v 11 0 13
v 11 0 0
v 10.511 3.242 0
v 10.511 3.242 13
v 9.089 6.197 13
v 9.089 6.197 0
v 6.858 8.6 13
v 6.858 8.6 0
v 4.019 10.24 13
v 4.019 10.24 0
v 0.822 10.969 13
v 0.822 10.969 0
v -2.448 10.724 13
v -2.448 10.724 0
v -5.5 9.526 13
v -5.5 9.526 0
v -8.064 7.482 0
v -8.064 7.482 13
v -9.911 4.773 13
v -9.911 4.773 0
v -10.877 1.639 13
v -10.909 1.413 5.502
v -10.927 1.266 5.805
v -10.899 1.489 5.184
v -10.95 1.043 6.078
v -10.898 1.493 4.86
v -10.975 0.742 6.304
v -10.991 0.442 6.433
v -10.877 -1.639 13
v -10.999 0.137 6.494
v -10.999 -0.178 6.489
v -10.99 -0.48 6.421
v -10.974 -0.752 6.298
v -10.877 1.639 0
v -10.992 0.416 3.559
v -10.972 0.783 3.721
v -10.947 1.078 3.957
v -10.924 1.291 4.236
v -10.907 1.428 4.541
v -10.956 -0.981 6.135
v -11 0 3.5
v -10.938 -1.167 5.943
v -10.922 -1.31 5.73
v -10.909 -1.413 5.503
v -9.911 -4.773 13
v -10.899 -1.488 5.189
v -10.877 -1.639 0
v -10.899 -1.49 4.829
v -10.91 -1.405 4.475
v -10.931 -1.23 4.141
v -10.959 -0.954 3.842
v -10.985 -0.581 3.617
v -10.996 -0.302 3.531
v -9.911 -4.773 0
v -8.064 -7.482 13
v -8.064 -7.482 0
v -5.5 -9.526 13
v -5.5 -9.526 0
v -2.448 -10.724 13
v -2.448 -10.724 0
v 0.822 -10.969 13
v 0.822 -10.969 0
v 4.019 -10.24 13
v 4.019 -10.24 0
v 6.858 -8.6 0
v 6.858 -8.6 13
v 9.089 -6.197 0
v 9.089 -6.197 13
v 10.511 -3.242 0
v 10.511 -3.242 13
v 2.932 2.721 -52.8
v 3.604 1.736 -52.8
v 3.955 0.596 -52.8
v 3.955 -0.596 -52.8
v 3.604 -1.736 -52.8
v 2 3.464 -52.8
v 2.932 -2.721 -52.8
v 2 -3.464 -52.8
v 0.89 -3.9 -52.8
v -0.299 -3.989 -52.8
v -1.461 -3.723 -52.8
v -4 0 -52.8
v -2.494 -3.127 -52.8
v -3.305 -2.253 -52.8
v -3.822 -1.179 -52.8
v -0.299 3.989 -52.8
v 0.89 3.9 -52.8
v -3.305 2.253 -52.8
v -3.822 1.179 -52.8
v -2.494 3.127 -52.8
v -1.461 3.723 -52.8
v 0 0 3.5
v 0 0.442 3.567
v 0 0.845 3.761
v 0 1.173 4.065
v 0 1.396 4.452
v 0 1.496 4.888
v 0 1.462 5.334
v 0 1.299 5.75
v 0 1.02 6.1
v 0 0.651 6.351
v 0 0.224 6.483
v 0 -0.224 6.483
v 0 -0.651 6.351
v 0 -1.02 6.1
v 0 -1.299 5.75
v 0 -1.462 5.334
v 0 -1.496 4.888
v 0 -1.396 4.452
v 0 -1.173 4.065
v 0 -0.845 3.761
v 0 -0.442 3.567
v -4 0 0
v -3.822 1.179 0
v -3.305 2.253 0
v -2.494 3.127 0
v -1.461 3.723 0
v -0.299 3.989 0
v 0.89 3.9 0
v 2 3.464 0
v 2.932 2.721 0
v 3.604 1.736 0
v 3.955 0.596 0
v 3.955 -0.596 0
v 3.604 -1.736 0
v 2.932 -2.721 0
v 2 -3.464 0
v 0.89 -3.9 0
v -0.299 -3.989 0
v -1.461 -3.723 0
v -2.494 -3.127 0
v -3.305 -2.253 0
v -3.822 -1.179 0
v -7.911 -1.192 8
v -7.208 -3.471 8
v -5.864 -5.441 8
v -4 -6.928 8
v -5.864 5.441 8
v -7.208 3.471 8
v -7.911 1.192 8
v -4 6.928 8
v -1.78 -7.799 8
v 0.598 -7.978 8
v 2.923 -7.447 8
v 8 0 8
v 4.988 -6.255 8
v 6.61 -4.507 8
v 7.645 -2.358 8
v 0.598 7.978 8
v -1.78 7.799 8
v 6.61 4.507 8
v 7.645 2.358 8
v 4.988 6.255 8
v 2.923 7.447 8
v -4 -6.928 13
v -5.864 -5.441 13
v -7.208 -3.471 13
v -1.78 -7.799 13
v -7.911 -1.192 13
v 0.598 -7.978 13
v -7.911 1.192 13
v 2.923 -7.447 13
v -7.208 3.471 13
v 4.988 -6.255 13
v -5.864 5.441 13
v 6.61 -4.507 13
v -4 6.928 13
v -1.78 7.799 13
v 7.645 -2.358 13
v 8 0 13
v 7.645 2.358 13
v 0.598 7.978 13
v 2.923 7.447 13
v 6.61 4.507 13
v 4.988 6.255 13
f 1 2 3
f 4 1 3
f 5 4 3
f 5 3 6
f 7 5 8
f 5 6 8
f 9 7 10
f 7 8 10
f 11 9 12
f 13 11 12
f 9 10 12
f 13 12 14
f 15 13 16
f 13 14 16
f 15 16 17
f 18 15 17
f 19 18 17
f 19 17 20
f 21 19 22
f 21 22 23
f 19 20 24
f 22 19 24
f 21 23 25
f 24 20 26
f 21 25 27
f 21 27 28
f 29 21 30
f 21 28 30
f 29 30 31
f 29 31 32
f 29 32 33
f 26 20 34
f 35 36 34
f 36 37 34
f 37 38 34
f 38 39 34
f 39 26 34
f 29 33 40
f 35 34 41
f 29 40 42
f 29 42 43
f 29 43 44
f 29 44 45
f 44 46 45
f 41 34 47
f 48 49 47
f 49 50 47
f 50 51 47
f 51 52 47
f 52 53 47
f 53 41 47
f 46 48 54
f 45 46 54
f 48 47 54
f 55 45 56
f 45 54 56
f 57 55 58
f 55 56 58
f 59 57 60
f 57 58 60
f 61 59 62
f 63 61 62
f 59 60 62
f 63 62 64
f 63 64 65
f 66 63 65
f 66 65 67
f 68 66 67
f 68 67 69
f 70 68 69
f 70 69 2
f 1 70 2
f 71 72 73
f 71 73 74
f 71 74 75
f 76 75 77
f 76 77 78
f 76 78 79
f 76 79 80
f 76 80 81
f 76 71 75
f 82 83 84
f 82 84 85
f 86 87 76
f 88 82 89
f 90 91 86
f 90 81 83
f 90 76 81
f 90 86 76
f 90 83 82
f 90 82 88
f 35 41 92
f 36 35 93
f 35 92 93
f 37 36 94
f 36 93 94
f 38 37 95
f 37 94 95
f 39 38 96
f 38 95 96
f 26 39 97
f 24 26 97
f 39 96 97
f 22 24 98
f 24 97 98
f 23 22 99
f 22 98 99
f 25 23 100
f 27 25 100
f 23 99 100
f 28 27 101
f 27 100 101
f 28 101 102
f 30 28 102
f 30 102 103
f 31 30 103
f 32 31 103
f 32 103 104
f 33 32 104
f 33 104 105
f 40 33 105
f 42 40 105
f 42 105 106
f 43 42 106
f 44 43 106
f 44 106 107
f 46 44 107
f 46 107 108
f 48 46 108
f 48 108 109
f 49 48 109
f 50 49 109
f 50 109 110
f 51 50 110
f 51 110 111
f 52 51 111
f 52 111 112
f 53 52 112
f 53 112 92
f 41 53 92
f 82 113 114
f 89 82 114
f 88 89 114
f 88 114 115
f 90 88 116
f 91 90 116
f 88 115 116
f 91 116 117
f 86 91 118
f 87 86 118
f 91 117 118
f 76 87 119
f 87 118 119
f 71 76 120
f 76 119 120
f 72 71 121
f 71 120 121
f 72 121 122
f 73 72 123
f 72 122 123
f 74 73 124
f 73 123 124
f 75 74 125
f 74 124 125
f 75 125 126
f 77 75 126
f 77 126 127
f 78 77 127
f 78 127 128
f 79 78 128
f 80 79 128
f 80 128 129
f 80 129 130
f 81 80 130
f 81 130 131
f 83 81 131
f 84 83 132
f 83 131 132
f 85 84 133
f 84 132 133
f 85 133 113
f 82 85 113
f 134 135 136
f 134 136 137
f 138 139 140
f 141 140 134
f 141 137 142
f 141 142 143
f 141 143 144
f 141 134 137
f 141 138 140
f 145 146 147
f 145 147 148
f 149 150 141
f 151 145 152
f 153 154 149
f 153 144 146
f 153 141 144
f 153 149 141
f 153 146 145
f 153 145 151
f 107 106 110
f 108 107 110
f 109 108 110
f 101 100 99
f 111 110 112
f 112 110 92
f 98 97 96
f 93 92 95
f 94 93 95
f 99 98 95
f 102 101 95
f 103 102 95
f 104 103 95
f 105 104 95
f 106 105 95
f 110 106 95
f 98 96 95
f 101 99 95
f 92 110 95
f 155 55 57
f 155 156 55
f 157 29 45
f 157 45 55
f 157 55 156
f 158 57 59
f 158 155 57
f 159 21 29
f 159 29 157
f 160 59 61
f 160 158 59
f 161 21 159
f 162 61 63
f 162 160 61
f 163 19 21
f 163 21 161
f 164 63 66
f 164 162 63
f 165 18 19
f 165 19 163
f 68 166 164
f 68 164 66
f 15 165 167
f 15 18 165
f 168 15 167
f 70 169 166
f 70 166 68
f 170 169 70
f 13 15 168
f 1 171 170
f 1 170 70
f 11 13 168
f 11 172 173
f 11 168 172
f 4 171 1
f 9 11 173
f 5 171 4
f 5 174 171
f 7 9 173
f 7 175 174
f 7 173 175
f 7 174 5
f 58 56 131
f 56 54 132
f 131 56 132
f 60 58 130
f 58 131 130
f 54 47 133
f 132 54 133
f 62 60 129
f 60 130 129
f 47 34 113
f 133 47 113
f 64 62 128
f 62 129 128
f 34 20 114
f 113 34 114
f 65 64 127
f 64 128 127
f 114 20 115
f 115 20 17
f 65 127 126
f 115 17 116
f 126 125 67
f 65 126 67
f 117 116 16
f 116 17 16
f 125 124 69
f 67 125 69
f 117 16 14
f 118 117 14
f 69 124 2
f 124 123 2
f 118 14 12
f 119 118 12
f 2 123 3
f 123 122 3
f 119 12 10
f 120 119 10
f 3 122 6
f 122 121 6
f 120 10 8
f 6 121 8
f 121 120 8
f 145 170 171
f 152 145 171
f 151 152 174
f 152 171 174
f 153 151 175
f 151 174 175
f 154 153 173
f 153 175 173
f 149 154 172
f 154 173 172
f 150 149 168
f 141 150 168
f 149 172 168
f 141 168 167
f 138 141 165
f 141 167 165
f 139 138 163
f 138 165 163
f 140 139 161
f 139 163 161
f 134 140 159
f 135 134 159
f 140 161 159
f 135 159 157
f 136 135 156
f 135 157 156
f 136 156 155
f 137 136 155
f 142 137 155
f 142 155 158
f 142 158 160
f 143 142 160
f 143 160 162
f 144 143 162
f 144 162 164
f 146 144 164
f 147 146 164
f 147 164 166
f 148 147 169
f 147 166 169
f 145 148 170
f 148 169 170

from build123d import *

# Parameters (mm, degrees)
CROQUIS1_R              = 11
SALIENTE_EXTRUIR1_DEPTH = 13
CROQUIS2_R              = 8
CORTAR_EXTRUIR1_DEPTH   = 5
CROQUIS3_R              = 1.5
CORTAR_EXTRUIR2_DEPTH   = 15
CROQUIS4_R              = 4
SALIENTE_EXTRUIR2_DEPTH = 52.8


with BuildPart() as part:
    # Croquis1 → Saliente-Extruir1 (new body)
    with BuildSketch(Plane.XY):
        Circle(CROQUIS1_R)
    extrude(amount=SALIENTE_EXTRUIR1_DEPTH)

    # Croquis2 → Cortar-Extruir1 (cut)
    with BuildSketch(Plane.XY.offset(13)):
        Circle(CROQUIS2_R)
    extrude(amount=-CORTAR_EXTRUIR1_DEPTH, mode=Mode.SUBTRACT)

    # Croquis3 → Cortar-Extruir2 (cut)
    with BuildSketch(Plane(origin=(0, 0, 0), x_dir=(0, 0, -1), z_dir=(1, 0, 0))):
        with Locations((-5, 0)):
            Circle(CROQUIS3_R)
    extrude(amount=-CORTAR_EXTRUIR2_DEPTH, mode=Mode.SUBTRACT)

    # Croquis4 → Saliente-Extruir2 (add)
    with BuildSketch(Plane(origin=(0, 0, 0), x_dir=(-1, 0, 0), z_dir=(0, 0, -1))):
        Circle(CROQUIS4_R)
    extrude(amount=SALIENTE_EXTRUIR2_DEPTH)


solid = part.part
